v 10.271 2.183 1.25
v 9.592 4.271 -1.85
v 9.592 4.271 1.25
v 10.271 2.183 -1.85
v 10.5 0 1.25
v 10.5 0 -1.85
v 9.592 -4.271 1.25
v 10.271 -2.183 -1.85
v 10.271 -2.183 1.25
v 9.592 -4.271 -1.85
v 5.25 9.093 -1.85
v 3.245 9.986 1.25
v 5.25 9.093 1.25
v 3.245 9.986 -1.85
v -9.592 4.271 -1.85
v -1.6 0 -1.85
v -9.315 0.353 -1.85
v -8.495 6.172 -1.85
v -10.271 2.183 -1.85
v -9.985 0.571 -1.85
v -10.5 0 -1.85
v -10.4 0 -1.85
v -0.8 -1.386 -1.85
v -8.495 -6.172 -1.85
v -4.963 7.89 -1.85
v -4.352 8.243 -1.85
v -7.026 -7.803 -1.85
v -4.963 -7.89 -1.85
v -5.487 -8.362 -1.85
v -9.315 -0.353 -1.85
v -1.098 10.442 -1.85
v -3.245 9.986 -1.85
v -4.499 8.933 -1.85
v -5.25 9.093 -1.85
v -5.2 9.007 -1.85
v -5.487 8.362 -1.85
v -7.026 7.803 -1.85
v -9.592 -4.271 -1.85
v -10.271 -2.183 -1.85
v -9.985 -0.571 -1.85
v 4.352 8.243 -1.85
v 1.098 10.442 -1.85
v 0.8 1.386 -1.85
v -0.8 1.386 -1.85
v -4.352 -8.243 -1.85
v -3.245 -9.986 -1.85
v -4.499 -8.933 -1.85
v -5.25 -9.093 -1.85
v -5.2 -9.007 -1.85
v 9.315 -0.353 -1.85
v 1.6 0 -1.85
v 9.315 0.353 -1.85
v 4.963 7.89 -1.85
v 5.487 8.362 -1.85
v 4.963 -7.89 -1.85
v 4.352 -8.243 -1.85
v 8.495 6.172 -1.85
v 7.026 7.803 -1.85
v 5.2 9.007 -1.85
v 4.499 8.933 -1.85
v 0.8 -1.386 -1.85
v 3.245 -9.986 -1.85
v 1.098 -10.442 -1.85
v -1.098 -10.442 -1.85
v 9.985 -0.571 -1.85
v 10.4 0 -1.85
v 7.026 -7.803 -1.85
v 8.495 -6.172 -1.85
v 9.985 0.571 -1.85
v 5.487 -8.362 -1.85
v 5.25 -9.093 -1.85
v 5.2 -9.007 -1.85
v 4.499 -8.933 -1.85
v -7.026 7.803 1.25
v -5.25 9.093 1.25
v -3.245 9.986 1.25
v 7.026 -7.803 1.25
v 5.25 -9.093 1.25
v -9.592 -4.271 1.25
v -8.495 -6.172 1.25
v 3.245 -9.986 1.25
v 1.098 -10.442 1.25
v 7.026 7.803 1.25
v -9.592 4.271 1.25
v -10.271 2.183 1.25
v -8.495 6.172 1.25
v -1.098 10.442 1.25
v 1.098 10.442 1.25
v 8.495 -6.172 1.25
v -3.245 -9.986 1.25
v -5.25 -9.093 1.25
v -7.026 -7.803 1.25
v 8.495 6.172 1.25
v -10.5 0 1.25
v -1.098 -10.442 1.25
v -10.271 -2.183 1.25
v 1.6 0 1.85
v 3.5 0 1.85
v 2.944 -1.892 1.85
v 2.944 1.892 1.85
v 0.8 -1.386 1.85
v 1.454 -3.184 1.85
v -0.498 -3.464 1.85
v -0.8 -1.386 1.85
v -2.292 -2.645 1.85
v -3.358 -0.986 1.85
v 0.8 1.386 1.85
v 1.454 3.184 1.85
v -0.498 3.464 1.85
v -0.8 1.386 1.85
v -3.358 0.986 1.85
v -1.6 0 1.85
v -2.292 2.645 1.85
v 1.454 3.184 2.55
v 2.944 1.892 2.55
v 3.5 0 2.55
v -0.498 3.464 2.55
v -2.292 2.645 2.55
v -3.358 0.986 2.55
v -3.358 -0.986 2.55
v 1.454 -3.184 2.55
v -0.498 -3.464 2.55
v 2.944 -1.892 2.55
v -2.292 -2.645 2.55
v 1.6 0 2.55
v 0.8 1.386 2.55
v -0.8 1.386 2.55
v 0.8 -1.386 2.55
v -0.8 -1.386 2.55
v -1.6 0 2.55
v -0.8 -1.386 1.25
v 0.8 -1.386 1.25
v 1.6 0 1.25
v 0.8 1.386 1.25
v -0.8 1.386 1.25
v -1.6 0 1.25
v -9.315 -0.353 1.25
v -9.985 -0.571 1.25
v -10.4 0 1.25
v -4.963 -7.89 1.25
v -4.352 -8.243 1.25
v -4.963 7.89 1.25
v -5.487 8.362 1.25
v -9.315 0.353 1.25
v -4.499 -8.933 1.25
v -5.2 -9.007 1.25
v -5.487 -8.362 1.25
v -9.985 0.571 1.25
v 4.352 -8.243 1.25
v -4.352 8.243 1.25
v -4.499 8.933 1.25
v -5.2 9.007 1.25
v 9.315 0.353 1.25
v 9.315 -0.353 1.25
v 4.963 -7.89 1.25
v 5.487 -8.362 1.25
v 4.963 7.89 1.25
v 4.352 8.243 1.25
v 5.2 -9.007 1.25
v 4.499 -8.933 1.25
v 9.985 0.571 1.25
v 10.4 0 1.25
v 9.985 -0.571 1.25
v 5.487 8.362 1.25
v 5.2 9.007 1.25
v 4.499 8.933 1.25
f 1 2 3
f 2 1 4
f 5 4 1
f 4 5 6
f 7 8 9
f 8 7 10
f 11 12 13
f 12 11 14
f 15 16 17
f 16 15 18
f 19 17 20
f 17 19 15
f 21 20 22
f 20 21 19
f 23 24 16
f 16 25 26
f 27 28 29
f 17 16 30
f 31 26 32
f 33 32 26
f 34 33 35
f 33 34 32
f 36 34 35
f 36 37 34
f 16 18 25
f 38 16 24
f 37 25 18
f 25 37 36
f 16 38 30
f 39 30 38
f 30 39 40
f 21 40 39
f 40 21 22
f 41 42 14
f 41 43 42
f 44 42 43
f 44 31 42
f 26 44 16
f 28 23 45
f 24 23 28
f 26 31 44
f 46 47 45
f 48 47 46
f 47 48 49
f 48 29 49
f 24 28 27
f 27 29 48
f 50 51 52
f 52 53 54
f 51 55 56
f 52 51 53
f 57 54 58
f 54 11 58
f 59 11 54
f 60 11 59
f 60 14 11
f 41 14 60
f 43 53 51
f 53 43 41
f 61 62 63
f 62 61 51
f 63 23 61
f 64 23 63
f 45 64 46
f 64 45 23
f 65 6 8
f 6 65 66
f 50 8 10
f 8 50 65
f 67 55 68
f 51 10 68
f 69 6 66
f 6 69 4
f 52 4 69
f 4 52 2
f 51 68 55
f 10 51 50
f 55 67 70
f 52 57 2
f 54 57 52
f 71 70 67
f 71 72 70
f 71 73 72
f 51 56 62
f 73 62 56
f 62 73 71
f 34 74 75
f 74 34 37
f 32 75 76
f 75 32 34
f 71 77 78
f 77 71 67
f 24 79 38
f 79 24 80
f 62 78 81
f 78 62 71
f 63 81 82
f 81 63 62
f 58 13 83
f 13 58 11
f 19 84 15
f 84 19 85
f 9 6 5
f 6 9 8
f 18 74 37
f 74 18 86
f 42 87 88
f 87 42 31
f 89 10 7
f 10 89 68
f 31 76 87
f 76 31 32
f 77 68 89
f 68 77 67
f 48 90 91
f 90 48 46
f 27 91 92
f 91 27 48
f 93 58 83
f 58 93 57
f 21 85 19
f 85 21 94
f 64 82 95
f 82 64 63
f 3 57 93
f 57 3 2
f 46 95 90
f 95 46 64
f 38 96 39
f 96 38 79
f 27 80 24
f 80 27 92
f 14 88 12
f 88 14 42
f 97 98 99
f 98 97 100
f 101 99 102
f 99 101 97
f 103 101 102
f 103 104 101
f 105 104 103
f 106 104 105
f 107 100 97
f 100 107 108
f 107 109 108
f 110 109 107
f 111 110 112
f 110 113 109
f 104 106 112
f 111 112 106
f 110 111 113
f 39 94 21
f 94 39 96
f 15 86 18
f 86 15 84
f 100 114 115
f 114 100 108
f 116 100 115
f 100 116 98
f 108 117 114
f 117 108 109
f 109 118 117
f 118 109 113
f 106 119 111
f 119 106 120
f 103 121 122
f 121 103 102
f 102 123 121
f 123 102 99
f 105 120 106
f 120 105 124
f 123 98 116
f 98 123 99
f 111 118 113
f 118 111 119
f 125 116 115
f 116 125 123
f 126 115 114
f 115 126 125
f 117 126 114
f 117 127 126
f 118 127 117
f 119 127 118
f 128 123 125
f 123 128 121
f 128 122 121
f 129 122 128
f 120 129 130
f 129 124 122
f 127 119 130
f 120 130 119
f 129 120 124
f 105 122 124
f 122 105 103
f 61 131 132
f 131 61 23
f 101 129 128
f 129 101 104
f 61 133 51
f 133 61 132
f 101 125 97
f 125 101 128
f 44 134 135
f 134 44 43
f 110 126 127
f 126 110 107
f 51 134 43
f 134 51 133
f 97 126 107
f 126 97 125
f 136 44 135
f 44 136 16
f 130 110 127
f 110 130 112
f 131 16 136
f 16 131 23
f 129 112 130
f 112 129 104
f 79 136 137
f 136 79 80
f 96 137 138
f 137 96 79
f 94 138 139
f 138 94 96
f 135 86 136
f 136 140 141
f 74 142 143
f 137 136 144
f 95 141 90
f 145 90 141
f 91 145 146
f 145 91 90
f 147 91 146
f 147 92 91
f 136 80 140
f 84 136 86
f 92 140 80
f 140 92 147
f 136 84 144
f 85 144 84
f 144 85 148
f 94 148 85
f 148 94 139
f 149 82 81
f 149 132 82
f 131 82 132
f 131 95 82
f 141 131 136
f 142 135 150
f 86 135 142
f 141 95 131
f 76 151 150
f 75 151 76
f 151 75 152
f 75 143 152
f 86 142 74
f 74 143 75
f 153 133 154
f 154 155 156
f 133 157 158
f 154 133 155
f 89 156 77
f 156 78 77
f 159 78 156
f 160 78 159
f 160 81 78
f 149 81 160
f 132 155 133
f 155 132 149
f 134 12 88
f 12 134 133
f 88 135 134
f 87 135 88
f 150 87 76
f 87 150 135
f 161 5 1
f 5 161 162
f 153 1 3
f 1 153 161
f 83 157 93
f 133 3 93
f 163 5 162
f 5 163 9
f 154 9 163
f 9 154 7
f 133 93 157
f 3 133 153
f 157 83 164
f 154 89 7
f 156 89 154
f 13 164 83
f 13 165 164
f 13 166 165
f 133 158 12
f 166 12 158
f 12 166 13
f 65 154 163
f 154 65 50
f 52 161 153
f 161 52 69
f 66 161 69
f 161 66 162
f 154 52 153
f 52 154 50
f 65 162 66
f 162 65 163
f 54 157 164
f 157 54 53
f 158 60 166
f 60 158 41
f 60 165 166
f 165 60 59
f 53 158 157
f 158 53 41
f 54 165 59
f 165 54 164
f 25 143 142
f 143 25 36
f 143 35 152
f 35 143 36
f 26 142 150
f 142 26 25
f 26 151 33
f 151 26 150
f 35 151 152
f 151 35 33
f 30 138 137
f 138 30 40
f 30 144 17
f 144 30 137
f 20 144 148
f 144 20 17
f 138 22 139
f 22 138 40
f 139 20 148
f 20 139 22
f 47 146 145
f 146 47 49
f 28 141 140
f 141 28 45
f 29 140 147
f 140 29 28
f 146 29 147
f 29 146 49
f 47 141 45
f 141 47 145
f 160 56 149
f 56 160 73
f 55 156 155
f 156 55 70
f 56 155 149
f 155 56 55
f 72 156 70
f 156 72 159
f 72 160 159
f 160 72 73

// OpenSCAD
// Parameters
R_main = 10.5; //[5.25:21:0.1]
H_main = 3.7; //[1.85:7.4:0.1]
R_secondary = 3.5; //[1.75:7:0.1]
H_secondary = 1.5; //[0.75:3:0.1]
overlap = 0.8; //[0.5:2:0.1]
R_hole = 1.6; //[0.8:3.2:0.1]
hole_extra = 1.0; //[0.5:3:0.1]
chamfer_h = 0.6; //[0.3:1.2:0.1]
chamfer_r = 0.8; //[0.4:1.6:0.1]
groove_count = 6; //[3:16:1]
groove_r = 0.6; //[0.3:1.2:0.1]
groove_depth = 0.7; //[0.3:1.5:0.1]

// Base Shapes
module main_radial_body() {
  translate([0, 0, 0])
    cylinder(r=R_main, h=H_main, center=true);
}

module secondary_radial_dimension() {
  translate([0, 0, H_main/2 + H_secondary/2 - overlap])
    cylinder(r=R_secondary, h=H_secondary, center=true);
}

module mounting_hole() {
  translate([0, 0, 0])
    cylinder(r=R_hole, h=H_main + H_secondary + 2*hole_extra, center=true);
}

module fillets_chamfers() {
  translate([0, 0, H_main/2 - chamfer_h/2])
    cylinder(r=R_main + chamfer_r, h=chamfer_h, center=true);
}

module decorative_groove_cutter_base() {
  translate([R_main - groove_depth, 0, 0])
    cylinder(r=groove_r, h=H_main + H_secondary + 2*hole_extra, center=true);
}

// Operations
module union_body_and_secondary() {
  union() {
    main_radial_body();
    secondary_radial_dimension();
  }
}

module difference_mounting_hole() {
  difference() {
    union_body_and_secondary();
    mounting_hole();
  }
}

module difference_chamfer_top_outer() {
  difference() {
    difference_mounting_hole();
    fillets_chamfers();
  }
}

module decorative_grooves() {
  difference() {
    difference_chamfer_top_outer();
    for (i = [0:groove_count-1]) {
      rotate([0, 0, i*360/groove_count])
        decorative_groove_cutter_base();
    }
  }
}

// Final Output
decorative_grooves();
